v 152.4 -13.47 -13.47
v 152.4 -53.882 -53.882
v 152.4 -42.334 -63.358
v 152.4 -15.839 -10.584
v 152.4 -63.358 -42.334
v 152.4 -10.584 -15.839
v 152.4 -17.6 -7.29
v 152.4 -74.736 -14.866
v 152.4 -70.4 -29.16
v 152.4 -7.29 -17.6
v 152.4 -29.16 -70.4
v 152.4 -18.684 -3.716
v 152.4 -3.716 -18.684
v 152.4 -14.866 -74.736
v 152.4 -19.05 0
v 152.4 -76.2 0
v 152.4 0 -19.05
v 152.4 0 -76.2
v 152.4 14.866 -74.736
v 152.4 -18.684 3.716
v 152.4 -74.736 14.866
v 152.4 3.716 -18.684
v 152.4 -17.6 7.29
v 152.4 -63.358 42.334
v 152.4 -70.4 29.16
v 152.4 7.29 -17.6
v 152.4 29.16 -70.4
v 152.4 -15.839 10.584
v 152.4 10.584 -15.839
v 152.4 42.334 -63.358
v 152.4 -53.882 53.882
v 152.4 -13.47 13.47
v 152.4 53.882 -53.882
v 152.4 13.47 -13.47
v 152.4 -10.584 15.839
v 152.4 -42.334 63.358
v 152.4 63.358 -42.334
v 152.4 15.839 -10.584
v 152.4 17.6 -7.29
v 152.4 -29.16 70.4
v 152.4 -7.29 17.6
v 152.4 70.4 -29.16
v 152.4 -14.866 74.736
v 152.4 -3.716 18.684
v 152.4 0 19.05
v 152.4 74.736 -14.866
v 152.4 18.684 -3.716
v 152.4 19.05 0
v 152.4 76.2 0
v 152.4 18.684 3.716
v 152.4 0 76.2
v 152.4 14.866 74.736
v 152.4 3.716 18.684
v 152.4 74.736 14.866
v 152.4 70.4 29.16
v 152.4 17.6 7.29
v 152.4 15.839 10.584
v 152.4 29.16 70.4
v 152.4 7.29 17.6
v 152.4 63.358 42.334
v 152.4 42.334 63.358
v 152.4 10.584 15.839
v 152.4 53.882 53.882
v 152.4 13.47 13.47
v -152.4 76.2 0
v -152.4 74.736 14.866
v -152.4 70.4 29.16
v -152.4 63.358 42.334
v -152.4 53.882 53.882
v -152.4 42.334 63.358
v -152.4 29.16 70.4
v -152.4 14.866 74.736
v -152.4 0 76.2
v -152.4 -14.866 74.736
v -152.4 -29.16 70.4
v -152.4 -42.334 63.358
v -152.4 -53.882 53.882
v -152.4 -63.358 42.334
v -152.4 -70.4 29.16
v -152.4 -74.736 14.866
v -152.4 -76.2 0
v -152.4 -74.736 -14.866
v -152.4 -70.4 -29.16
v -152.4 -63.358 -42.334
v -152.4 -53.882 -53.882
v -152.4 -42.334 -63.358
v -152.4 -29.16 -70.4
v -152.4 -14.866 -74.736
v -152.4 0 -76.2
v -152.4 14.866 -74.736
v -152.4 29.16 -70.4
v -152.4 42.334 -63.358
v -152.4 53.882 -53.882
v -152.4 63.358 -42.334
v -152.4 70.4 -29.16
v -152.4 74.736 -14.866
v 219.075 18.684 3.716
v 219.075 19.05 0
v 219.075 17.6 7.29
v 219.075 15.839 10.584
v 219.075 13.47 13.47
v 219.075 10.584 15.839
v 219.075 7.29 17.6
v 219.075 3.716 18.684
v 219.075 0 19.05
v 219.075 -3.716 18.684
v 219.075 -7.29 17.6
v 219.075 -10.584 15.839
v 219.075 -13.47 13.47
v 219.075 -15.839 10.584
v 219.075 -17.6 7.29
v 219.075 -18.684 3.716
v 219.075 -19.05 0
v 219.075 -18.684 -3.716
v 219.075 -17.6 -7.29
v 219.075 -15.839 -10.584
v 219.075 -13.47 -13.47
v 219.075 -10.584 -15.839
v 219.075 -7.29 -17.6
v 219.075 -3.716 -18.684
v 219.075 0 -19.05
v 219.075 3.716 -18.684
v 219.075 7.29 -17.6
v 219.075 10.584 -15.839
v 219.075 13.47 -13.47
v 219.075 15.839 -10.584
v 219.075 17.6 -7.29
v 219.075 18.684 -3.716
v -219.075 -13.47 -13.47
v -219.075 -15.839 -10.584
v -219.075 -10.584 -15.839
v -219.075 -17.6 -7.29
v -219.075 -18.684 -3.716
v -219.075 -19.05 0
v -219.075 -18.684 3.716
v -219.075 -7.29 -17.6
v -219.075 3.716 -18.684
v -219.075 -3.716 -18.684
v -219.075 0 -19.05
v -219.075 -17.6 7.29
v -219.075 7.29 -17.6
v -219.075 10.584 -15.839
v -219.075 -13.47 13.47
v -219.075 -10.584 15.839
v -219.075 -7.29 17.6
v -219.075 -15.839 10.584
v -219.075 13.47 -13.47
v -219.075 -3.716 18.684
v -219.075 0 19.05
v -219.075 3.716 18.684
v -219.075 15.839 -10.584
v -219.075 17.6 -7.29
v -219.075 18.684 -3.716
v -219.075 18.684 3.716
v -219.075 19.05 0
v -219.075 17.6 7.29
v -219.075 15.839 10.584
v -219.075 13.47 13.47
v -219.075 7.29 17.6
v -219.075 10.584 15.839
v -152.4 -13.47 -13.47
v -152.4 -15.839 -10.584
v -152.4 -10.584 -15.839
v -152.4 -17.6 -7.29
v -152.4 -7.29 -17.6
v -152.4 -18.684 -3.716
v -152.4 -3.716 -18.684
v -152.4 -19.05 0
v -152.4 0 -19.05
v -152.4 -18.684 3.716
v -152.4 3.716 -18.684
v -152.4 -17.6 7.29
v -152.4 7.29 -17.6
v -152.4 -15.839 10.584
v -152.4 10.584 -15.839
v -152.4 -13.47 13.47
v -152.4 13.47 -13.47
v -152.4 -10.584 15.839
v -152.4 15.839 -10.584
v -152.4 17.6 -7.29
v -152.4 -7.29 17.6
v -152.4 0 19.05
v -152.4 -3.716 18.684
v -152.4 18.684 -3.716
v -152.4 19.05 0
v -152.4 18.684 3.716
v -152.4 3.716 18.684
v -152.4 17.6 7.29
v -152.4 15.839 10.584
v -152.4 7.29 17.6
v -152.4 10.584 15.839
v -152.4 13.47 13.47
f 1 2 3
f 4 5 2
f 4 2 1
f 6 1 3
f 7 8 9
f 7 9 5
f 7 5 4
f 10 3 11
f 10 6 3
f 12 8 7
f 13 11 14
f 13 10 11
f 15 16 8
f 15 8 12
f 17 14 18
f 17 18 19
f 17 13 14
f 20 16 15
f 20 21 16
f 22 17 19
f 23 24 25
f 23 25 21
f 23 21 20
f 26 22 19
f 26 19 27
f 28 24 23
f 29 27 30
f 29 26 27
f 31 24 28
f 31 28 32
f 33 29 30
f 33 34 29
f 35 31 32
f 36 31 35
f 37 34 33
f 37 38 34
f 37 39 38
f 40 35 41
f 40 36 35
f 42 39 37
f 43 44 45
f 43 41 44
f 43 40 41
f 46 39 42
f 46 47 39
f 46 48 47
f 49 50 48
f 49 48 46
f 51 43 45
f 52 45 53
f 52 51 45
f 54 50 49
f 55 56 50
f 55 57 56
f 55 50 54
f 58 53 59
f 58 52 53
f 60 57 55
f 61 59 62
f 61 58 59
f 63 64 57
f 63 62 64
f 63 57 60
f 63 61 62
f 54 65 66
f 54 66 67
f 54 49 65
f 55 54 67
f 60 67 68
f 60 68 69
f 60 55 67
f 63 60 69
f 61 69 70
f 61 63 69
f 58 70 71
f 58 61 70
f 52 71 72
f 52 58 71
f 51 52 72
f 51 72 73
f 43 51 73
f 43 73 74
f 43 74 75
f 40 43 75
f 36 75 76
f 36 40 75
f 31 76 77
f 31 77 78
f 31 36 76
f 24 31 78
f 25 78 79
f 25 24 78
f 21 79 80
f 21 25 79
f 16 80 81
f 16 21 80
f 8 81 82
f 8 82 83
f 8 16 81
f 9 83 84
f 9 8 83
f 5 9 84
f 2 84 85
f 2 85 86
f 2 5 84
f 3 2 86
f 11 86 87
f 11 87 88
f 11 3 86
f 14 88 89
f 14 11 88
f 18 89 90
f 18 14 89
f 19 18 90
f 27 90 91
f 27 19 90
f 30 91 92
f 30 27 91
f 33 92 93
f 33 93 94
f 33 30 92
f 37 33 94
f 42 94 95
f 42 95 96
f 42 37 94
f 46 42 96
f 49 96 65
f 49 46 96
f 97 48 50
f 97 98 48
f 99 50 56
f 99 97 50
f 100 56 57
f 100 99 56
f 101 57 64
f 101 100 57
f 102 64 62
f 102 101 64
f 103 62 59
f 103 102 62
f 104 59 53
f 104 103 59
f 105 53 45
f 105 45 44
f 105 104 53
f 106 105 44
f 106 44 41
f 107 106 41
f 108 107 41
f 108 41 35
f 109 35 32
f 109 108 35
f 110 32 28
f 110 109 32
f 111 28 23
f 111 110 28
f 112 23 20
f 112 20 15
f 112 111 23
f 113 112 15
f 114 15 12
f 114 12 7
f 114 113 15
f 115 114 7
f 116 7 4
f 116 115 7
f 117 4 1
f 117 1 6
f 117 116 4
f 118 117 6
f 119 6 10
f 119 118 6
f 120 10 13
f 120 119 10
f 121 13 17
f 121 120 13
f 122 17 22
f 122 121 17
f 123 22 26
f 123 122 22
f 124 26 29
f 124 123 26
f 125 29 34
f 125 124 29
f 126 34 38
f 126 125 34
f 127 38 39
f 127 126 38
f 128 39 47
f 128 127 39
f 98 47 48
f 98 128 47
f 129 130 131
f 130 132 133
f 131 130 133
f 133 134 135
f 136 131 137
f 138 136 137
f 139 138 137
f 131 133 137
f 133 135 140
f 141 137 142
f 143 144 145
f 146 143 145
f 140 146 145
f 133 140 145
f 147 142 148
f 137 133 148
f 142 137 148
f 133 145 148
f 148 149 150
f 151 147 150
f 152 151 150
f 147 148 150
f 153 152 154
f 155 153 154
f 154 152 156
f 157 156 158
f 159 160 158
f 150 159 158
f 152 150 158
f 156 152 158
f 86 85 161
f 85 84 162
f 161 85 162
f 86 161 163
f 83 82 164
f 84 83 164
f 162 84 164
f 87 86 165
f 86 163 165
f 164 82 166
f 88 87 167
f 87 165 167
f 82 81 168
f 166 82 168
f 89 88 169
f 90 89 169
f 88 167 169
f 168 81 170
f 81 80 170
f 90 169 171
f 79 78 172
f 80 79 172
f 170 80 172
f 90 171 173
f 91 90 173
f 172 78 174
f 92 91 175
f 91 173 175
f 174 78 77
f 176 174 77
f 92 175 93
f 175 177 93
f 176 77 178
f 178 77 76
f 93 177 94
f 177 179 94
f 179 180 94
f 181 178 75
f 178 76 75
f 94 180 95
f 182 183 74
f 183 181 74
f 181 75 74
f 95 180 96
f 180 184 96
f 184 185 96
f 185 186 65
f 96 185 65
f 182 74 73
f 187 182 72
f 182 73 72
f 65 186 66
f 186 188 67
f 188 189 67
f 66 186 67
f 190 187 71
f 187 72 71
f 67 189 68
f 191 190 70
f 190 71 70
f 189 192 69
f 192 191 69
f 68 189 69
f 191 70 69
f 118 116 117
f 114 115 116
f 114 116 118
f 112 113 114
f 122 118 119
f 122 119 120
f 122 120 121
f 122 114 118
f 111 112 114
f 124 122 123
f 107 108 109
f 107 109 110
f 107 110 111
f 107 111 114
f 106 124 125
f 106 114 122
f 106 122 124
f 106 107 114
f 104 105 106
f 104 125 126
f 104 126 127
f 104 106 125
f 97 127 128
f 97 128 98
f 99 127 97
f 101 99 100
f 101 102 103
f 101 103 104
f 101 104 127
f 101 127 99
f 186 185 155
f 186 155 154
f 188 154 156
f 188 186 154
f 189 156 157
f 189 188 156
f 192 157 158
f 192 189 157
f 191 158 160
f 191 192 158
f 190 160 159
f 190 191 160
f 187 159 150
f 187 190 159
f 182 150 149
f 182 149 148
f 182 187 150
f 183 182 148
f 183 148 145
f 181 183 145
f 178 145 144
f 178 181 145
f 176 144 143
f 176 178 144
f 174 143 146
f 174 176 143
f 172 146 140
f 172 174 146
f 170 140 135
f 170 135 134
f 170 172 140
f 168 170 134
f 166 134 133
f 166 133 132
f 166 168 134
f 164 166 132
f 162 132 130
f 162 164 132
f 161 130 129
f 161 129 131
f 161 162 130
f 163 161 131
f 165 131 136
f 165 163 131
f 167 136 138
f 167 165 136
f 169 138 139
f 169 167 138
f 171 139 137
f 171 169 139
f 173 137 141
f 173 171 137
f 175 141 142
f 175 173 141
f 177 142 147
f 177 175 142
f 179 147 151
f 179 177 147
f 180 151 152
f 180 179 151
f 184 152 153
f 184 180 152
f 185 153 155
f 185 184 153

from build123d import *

# Parameters (mm, degrees)
F0_R     = 19.05
F1_DEPTH = 219.075
F2_R     = 76.2
F3_DEPTH = 152.4


with BuildPart() as f1:
    # F0 (on Right) → F1 (new body, symmetric)
    with BuildSketch(Plane.YZ):
        Circle(F0_R)
    extrude(amount=F1_DEPTH, both=True)

    # F2 (on Right) → F3 (join, symmetric)
    with BuildSketch(Plane.YZ):
        Circle(F2_R)
    extrude(amount=F3_DEPTH, both=True)


solid = f1.part
